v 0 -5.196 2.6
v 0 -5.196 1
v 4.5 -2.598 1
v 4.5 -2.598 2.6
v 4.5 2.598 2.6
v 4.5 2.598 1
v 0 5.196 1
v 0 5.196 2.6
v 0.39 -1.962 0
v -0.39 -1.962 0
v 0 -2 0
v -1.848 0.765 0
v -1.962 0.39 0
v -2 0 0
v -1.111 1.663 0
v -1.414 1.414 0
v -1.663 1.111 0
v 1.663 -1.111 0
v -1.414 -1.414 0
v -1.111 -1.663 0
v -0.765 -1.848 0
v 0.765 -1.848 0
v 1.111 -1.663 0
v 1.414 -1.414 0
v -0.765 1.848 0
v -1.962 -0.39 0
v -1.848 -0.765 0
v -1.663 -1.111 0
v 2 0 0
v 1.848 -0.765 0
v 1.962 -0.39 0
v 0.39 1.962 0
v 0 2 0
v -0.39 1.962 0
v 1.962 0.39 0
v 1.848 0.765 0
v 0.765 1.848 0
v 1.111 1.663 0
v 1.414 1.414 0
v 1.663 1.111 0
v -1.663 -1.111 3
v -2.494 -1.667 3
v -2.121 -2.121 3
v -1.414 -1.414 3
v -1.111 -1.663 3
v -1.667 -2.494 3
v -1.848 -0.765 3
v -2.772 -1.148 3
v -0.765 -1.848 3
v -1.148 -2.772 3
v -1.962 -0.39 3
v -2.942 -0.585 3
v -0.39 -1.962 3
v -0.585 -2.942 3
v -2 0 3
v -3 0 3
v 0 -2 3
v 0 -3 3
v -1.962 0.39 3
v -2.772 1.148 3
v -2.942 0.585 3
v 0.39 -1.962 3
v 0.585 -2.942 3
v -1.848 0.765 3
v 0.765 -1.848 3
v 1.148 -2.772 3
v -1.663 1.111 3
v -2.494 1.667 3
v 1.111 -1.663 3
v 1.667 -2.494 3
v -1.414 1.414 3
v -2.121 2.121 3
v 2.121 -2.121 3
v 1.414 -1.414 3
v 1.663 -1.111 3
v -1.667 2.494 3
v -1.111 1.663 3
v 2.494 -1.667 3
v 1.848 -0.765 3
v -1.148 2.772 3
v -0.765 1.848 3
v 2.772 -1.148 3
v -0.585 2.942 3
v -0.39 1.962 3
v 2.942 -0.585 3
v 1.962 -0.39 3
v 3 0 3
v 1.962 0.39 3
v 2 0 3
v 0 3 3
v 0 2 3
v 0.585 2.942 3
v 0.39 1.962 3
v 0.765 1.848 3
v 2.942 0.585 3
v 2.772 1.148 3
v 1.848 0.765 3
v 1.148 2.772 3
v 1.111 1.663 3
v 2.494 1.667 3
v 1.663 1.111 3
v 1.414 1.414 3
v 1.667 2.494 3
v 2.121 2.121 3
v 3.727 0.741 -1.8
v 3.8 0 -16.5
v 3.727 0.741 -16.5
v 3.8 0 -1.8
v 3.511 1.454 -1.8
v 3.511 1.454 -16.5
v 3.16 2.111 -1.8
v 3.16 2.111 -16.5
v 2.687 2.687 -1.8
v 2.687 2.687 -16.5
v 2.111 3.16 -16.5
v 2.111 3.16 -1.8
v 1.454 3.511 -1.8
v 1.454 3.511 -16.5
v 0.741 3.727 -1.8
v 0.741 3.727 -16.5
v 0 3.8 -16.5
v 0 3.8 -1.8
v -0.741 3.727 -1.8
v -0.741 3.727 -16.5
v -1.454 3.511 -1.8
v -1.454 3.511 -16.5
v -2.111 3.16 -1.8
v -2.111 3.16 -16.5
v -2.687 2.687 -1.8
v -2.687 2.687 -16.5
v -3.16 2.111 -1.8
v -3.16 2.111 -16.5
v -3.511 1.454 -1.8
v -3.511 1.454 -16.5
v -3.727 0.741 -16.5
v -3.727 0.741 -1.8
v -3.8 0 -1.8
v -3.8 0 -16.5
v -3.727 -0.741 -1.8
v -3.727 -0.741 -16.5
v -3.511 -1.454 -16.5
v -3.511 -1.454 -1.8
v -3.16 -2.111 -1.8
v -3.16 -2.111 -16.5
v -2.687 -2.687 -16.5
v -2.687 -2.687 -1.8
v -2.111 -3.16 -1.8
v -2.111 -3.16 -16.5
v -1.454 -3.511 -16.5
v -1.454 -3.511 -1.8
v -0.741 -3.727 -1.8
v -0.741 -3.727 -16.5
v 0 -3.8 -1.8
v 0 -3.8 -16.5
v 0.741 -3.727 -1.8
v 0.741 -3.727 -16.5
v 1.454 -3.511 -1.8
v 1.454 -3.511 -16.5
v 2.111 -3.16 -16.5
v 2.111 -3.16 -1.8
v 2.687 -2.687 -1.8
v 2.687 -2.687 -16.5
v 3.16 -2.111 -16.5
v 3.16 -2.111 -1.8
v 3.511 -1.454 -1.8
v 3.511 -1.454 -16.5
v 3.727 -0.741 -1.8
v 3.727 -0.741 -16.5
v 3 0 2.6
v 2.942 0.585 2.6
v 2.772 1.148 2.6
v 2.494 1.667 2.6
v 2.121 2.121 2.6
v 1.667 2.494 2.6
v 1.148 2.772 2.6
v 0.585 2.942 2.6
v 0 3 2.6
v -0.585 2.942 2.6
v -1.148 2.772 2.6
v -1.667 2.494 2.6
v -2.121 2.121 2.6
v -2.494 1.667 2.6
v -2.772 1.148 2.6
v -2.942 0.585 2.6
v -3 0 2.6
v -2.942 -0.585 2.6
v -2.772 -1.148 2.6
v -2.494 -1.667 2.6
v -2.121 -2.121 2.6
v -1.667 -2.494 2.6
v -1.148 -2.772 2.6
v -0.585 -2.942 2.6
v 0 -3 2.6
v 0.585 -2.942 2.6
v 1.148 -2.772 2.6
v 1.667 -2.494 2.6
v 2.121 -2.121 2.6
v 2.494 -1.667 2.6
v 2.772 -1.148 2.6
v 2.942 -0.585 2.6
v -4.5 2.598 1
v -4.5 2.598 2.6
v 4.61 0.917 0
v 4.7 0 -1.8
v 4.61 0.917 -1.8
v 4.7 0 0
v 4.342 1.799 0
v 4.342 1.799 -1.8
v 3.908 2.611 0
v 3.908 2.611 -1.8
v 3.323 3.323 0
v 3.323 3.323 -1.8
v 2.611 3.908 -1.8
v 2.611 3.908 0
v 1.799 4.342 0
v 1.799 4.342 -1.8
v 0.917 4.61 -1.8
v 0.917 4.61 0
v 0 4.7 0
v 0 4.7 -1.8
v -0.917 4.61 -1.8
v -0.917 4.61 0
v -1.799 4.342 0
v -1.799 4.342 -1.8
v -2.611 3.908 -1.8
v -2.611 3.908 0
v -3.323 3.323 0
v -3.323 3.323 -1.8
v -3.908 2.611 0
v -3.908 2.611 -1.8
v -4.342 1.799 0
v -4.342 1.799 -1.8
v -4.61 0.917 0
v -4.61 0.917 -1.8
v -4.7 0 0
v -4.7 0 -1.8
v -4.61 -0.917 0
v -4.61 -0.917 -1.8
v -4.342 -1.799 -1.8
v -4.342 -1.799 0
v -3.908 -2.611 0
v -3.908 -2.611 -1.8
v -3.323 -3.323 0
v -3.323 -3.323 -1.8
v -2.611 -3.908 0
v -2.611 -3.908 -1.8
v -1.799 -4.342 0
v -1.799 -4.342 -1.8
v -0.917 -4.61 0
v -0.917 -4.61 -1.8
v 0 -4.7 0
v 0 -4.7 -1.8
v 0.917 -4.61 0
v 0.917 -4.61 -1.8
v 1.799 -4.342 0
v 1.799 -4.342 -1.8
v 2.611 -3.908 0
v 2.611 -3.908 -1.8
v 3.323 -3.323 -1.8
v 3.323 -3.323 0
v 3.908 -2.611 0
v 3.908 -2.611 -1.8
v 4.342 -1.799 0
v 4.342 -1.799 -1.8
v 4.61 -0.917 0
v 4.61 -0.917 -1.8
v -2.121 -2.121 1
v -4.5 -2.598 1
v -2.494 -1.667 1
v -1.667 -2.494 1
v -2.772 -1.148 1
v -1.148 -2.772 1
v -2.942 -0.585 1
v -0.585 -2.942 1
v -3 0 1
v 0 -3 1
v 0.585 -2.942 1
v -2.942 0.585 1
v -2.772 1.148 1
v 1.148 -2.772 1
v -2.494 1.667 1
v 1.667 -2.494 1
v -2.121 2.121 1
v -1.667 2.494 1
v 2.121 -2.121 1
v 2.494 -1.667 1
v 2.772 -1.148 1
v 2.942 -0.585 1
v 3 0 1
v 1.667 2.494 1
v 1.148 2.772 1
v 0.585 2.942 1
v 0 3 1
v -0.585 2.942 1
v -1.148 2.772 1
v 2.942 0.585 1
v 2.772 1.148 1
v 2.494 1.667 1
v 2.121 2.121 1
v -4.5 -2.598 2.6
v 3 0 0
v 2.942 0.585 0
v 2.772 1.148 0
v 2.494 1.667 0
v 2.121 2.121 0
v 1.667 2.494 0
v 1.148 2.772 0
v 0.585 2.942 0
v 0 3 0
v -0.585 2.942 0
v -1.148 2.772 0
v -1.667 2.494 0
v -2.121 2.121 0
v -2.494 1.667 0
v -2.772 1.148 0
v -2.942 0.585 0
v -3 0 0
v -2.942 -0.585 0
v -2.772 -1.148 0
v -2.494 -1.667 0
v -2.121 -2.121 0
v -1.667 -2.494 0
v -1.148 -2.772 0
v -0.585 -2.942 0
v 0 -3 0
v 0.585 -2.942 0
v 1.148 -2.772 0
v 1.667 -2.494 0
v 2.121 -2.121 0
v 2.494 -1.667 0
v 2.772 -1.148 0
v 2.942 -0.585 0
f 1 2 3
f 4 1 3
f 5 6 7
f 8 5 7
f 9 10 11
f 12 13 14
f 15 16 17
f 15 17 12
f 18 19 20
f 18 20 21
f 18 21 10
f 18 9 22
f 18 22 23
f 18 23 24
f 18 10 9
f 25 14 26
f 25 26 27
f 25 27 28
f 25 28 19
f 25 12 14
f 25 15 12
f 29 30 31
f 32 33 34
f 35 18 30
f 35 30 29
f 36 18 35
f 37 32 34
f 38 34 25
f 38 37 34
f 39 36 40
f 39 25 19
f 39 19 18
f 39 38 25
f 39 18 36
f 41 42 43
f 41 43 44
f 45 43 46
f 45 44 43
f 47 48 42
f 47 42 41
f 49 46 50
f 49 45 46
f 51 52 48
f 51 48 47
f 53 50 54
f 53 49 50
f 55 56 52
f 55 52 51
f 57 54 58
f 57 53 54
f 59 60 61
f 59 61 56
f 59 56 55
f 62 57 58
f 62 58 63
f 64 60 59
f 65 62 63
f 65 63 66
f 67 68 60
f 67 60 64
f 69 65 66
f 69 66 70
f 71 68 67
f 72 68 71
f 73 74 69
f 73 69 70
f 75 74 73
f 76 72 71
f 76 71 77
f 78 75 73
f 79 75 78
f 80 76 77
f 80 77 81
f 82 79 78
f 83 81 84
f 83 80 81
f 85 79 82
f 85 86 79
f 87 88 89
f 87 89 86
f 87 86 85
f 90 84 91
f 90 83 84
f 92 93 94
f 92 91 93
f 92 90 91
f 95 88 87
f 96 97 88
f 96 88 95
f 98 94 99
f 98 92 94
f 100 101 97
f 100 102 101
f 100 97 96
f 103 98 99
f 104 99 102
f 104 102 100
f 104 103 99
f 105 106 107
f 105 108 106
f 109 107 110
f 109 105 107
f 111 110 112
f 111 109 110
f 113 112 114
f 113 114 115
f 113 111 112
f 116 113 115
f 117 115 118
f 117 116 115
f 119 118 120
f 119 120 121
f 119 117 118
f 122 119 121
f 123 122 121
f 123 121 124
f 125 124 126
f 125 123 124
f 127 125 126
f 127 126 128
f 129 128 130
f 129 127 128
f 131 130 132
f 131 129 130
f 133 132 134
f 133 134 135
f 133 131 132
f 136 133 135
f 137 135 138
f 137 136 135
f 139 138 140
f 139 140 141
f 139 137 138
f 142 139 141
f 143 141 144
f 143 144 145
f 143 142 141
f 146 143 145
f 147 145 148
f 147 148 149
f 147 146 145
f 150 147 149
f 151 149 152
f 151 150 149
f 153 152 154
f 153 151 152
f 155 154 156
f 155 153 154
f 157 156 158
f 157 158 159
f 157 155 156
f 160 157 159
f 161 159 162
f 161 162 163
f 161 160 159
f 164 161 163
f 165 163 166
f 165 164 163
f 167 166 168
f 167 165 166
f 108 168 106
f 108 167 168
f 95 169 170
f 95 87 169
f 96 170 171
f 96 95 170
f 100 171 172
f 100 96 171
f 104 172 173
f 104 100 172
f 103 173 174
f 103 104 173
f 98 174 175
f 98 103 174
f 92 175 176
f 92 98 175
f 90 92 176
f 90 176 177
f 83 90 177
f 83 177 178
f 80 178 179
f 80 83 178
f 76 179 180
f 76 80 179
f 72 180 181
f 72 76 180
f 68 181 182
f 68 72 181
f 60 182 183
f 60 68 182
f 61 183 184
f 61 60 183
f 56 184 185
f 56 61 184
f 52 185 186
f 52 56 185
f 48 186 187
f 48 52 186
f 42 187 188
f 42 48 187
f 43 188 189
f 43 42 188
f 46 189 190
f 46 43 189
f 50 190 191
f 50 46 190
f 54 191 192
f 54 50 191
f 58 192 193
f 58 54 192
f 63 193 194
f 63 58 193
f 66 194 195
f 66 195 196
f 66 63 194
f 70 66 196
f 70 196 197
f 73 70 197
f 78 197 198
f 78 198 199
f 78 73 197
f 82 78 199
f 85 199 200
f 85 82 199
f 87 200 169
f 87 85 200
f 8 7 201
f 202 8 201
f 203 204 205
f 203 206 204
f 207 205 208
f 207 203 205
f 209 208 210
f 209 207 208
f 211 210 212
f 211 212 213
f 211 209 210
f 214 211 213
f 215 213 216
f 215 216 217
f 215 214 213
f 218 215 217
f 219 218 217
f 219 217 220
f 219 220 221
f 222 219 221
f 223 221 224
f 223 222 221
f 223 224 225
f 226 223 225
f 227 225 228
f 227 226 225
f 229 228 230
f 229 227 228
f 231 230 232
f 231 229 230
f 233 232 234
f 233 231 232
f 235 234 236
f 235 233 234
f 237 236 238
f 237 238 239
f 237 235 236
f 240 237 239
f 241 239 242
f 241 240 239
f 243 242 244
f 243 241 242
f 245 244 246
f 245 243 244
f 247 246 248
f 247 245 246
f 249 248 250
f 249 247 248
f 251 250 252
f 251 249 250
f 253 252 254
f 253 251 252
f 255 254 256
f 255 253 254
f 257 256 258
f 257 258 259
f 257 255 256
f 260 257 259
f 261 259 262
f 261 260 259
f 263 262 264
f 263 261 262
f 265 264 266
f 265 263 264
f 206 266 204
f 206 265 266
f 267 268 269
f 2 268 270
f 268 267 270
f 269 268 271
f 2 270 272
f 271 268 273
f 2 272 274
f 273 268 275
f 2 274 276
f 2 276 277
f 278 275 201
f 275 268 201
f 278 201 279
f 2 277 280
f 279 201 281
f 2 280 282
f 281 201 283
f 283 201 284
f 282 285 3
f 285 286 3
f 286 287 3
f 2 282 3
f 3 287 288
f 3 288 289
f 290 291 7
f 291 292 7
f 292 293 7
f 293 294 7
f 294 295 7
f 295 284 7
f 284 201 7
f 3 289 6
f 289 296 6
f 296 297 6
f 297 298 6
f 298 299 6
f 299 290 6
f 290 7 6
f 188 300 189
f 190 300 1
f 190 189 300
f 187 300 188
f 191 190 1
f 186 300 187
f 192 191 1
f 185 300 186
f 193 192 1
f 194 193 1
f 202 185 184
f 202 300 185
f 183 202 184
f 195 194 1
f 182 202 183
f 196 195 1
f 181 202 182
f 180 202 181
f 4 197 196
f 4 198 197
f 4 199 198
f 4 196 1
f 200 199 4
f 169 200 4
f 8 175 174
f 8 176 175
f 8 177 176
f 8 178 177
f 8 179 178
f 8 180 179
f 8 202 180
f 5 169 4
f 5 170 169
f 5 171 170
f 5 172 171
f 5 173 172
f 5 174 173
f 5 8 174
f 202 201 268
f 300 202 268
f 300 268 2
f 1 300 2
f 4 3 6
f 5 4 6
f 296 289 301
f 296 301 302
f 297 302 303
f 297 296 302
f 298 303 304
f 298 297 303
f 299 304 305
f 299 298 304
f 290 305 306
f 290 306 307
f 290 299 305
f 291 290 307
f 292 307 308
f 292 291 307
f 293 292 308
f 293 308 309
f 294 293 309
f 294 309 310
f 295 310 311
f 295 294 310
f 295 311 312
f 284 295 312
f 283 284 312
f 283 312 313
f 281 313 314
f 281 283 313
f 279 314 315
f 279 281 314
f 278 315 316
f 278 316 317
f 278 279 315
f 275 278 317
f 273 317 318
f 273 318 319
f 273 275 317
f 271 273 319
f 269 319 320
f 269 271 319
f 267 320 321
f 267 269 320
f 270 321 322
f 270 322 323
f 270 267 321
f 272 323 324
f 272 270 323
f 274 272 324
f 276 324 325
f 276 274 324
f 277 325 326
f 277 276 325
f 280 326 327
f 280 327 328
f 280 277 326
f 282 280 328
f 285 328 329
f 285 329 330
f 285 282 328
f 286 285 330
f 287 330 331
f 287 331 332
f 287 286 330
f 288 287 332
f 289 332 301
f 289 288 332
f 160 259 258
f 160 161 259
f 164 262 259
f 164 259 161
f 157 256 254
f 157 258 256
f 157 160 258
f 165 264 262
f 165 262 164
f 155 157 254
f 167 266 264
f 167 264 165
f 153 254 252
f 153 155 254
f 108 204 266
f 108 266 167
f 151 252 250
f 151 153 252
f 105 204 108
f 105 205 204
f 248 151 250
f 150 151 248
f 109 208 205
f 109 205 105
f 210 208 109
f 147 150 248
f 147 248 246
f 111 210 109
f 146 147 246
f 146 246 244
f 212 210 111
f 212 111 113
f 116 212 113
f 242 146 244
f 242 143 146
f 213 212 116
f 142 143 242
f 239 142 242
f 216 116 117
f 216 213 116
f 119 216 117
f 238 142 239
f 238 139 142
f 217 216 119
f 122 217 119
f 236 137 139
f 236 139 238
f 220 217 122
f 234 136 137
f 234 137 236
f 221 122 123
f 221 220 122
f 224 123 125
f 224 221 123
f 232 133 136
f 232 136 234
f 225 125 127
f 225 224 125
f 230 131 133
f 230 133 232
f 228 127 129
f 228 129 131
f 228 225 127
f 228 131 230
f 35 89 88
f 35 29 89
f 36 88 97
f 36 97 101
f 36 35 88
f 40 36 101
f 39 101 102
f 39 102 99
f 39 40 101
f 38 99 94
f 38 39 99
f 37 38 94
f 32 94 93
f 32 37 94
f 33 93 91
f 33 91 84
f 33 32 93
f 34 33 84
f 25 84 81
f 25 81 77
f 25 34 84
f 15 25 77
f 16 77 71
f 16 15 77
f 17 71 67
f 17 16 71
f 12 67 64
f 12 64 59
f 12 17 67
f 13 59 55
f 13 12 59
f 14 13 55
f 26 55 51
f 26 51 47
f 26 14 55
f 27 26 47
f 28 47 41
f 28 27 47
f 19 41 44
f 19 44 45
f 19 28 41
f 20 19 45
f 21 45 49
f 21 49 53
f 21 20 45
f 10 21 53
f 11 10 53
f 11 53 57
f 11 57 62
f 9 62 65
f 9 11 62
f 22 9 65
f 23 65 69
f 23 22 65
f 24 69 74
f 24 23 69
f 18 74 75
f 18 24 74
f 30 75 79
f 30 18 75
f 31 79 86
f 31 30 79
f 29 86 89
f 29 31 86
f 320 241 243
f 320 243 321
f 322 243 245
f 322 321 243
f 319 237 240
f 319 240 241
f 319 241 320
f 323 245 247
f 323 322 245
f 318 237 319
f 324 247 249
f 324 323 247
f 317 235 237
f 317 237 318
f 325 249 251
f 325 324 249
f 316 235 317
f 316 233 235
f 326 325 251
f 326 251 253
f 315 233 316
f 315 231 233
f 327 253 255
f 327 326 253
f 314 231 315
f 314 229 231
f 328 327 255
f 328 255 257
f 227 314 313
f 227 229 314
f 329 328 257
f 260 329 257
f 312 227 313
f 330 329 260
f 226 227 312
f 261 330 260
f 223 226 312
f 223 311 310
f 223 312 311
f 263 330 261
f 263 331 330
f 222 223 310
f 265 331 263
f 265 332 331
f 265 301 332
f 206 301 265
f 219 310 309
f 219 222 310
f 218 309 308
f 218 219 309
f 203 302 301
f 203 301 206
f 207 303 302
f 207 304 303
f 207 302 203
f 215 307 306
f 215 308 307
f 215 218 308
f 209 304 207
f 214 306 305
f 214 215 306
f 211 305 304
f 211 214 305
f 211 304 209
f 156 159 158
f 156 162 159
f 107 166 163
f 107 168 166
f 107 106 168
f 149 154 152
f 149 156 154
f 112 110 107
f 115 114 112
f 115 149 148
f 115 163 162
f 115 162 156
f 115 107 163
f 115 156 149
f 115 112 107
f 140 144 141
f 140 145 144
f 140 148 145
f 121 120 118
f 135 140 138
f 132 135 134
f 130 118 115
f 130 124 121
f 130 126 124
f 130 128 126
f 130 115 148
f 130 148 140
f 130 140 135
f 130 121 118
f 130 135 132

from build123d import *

# Parameters (mm, degrees)
F3_R     = 2
F4_DEPTH = 1.6


with BuildPart() as f1:
    # F0 (on Front) → F1 (revolve)
    with BuildSketch(Plane.XZ):
        Polygon((2, 0), (0, 0), (0, -16.5), (3.8, -16.5), (3.8, -1.8), (4.7, -1.8), (4.7, 0), (3, 0), (3, 3), (2, 3), align=None)
    revolve(axis=Axis((0, 0, -8.25), (0, 0, 1)))

    # F3 (on offset) → F4 (join)
    with BuildSketch(Plane.XY.offset(1)):
        Polygon((4.5, -2.598076), (4.5, 2.598076), (0, 5.196152), (-4.5, 2.598076), (-4.5, -2.598076), (0, -5.196152), align=None)
        Circle(F3_R, mode=Mode.SUBTRACT)
    extrude(amount=F4_DEPTH)


solid = f1.part
